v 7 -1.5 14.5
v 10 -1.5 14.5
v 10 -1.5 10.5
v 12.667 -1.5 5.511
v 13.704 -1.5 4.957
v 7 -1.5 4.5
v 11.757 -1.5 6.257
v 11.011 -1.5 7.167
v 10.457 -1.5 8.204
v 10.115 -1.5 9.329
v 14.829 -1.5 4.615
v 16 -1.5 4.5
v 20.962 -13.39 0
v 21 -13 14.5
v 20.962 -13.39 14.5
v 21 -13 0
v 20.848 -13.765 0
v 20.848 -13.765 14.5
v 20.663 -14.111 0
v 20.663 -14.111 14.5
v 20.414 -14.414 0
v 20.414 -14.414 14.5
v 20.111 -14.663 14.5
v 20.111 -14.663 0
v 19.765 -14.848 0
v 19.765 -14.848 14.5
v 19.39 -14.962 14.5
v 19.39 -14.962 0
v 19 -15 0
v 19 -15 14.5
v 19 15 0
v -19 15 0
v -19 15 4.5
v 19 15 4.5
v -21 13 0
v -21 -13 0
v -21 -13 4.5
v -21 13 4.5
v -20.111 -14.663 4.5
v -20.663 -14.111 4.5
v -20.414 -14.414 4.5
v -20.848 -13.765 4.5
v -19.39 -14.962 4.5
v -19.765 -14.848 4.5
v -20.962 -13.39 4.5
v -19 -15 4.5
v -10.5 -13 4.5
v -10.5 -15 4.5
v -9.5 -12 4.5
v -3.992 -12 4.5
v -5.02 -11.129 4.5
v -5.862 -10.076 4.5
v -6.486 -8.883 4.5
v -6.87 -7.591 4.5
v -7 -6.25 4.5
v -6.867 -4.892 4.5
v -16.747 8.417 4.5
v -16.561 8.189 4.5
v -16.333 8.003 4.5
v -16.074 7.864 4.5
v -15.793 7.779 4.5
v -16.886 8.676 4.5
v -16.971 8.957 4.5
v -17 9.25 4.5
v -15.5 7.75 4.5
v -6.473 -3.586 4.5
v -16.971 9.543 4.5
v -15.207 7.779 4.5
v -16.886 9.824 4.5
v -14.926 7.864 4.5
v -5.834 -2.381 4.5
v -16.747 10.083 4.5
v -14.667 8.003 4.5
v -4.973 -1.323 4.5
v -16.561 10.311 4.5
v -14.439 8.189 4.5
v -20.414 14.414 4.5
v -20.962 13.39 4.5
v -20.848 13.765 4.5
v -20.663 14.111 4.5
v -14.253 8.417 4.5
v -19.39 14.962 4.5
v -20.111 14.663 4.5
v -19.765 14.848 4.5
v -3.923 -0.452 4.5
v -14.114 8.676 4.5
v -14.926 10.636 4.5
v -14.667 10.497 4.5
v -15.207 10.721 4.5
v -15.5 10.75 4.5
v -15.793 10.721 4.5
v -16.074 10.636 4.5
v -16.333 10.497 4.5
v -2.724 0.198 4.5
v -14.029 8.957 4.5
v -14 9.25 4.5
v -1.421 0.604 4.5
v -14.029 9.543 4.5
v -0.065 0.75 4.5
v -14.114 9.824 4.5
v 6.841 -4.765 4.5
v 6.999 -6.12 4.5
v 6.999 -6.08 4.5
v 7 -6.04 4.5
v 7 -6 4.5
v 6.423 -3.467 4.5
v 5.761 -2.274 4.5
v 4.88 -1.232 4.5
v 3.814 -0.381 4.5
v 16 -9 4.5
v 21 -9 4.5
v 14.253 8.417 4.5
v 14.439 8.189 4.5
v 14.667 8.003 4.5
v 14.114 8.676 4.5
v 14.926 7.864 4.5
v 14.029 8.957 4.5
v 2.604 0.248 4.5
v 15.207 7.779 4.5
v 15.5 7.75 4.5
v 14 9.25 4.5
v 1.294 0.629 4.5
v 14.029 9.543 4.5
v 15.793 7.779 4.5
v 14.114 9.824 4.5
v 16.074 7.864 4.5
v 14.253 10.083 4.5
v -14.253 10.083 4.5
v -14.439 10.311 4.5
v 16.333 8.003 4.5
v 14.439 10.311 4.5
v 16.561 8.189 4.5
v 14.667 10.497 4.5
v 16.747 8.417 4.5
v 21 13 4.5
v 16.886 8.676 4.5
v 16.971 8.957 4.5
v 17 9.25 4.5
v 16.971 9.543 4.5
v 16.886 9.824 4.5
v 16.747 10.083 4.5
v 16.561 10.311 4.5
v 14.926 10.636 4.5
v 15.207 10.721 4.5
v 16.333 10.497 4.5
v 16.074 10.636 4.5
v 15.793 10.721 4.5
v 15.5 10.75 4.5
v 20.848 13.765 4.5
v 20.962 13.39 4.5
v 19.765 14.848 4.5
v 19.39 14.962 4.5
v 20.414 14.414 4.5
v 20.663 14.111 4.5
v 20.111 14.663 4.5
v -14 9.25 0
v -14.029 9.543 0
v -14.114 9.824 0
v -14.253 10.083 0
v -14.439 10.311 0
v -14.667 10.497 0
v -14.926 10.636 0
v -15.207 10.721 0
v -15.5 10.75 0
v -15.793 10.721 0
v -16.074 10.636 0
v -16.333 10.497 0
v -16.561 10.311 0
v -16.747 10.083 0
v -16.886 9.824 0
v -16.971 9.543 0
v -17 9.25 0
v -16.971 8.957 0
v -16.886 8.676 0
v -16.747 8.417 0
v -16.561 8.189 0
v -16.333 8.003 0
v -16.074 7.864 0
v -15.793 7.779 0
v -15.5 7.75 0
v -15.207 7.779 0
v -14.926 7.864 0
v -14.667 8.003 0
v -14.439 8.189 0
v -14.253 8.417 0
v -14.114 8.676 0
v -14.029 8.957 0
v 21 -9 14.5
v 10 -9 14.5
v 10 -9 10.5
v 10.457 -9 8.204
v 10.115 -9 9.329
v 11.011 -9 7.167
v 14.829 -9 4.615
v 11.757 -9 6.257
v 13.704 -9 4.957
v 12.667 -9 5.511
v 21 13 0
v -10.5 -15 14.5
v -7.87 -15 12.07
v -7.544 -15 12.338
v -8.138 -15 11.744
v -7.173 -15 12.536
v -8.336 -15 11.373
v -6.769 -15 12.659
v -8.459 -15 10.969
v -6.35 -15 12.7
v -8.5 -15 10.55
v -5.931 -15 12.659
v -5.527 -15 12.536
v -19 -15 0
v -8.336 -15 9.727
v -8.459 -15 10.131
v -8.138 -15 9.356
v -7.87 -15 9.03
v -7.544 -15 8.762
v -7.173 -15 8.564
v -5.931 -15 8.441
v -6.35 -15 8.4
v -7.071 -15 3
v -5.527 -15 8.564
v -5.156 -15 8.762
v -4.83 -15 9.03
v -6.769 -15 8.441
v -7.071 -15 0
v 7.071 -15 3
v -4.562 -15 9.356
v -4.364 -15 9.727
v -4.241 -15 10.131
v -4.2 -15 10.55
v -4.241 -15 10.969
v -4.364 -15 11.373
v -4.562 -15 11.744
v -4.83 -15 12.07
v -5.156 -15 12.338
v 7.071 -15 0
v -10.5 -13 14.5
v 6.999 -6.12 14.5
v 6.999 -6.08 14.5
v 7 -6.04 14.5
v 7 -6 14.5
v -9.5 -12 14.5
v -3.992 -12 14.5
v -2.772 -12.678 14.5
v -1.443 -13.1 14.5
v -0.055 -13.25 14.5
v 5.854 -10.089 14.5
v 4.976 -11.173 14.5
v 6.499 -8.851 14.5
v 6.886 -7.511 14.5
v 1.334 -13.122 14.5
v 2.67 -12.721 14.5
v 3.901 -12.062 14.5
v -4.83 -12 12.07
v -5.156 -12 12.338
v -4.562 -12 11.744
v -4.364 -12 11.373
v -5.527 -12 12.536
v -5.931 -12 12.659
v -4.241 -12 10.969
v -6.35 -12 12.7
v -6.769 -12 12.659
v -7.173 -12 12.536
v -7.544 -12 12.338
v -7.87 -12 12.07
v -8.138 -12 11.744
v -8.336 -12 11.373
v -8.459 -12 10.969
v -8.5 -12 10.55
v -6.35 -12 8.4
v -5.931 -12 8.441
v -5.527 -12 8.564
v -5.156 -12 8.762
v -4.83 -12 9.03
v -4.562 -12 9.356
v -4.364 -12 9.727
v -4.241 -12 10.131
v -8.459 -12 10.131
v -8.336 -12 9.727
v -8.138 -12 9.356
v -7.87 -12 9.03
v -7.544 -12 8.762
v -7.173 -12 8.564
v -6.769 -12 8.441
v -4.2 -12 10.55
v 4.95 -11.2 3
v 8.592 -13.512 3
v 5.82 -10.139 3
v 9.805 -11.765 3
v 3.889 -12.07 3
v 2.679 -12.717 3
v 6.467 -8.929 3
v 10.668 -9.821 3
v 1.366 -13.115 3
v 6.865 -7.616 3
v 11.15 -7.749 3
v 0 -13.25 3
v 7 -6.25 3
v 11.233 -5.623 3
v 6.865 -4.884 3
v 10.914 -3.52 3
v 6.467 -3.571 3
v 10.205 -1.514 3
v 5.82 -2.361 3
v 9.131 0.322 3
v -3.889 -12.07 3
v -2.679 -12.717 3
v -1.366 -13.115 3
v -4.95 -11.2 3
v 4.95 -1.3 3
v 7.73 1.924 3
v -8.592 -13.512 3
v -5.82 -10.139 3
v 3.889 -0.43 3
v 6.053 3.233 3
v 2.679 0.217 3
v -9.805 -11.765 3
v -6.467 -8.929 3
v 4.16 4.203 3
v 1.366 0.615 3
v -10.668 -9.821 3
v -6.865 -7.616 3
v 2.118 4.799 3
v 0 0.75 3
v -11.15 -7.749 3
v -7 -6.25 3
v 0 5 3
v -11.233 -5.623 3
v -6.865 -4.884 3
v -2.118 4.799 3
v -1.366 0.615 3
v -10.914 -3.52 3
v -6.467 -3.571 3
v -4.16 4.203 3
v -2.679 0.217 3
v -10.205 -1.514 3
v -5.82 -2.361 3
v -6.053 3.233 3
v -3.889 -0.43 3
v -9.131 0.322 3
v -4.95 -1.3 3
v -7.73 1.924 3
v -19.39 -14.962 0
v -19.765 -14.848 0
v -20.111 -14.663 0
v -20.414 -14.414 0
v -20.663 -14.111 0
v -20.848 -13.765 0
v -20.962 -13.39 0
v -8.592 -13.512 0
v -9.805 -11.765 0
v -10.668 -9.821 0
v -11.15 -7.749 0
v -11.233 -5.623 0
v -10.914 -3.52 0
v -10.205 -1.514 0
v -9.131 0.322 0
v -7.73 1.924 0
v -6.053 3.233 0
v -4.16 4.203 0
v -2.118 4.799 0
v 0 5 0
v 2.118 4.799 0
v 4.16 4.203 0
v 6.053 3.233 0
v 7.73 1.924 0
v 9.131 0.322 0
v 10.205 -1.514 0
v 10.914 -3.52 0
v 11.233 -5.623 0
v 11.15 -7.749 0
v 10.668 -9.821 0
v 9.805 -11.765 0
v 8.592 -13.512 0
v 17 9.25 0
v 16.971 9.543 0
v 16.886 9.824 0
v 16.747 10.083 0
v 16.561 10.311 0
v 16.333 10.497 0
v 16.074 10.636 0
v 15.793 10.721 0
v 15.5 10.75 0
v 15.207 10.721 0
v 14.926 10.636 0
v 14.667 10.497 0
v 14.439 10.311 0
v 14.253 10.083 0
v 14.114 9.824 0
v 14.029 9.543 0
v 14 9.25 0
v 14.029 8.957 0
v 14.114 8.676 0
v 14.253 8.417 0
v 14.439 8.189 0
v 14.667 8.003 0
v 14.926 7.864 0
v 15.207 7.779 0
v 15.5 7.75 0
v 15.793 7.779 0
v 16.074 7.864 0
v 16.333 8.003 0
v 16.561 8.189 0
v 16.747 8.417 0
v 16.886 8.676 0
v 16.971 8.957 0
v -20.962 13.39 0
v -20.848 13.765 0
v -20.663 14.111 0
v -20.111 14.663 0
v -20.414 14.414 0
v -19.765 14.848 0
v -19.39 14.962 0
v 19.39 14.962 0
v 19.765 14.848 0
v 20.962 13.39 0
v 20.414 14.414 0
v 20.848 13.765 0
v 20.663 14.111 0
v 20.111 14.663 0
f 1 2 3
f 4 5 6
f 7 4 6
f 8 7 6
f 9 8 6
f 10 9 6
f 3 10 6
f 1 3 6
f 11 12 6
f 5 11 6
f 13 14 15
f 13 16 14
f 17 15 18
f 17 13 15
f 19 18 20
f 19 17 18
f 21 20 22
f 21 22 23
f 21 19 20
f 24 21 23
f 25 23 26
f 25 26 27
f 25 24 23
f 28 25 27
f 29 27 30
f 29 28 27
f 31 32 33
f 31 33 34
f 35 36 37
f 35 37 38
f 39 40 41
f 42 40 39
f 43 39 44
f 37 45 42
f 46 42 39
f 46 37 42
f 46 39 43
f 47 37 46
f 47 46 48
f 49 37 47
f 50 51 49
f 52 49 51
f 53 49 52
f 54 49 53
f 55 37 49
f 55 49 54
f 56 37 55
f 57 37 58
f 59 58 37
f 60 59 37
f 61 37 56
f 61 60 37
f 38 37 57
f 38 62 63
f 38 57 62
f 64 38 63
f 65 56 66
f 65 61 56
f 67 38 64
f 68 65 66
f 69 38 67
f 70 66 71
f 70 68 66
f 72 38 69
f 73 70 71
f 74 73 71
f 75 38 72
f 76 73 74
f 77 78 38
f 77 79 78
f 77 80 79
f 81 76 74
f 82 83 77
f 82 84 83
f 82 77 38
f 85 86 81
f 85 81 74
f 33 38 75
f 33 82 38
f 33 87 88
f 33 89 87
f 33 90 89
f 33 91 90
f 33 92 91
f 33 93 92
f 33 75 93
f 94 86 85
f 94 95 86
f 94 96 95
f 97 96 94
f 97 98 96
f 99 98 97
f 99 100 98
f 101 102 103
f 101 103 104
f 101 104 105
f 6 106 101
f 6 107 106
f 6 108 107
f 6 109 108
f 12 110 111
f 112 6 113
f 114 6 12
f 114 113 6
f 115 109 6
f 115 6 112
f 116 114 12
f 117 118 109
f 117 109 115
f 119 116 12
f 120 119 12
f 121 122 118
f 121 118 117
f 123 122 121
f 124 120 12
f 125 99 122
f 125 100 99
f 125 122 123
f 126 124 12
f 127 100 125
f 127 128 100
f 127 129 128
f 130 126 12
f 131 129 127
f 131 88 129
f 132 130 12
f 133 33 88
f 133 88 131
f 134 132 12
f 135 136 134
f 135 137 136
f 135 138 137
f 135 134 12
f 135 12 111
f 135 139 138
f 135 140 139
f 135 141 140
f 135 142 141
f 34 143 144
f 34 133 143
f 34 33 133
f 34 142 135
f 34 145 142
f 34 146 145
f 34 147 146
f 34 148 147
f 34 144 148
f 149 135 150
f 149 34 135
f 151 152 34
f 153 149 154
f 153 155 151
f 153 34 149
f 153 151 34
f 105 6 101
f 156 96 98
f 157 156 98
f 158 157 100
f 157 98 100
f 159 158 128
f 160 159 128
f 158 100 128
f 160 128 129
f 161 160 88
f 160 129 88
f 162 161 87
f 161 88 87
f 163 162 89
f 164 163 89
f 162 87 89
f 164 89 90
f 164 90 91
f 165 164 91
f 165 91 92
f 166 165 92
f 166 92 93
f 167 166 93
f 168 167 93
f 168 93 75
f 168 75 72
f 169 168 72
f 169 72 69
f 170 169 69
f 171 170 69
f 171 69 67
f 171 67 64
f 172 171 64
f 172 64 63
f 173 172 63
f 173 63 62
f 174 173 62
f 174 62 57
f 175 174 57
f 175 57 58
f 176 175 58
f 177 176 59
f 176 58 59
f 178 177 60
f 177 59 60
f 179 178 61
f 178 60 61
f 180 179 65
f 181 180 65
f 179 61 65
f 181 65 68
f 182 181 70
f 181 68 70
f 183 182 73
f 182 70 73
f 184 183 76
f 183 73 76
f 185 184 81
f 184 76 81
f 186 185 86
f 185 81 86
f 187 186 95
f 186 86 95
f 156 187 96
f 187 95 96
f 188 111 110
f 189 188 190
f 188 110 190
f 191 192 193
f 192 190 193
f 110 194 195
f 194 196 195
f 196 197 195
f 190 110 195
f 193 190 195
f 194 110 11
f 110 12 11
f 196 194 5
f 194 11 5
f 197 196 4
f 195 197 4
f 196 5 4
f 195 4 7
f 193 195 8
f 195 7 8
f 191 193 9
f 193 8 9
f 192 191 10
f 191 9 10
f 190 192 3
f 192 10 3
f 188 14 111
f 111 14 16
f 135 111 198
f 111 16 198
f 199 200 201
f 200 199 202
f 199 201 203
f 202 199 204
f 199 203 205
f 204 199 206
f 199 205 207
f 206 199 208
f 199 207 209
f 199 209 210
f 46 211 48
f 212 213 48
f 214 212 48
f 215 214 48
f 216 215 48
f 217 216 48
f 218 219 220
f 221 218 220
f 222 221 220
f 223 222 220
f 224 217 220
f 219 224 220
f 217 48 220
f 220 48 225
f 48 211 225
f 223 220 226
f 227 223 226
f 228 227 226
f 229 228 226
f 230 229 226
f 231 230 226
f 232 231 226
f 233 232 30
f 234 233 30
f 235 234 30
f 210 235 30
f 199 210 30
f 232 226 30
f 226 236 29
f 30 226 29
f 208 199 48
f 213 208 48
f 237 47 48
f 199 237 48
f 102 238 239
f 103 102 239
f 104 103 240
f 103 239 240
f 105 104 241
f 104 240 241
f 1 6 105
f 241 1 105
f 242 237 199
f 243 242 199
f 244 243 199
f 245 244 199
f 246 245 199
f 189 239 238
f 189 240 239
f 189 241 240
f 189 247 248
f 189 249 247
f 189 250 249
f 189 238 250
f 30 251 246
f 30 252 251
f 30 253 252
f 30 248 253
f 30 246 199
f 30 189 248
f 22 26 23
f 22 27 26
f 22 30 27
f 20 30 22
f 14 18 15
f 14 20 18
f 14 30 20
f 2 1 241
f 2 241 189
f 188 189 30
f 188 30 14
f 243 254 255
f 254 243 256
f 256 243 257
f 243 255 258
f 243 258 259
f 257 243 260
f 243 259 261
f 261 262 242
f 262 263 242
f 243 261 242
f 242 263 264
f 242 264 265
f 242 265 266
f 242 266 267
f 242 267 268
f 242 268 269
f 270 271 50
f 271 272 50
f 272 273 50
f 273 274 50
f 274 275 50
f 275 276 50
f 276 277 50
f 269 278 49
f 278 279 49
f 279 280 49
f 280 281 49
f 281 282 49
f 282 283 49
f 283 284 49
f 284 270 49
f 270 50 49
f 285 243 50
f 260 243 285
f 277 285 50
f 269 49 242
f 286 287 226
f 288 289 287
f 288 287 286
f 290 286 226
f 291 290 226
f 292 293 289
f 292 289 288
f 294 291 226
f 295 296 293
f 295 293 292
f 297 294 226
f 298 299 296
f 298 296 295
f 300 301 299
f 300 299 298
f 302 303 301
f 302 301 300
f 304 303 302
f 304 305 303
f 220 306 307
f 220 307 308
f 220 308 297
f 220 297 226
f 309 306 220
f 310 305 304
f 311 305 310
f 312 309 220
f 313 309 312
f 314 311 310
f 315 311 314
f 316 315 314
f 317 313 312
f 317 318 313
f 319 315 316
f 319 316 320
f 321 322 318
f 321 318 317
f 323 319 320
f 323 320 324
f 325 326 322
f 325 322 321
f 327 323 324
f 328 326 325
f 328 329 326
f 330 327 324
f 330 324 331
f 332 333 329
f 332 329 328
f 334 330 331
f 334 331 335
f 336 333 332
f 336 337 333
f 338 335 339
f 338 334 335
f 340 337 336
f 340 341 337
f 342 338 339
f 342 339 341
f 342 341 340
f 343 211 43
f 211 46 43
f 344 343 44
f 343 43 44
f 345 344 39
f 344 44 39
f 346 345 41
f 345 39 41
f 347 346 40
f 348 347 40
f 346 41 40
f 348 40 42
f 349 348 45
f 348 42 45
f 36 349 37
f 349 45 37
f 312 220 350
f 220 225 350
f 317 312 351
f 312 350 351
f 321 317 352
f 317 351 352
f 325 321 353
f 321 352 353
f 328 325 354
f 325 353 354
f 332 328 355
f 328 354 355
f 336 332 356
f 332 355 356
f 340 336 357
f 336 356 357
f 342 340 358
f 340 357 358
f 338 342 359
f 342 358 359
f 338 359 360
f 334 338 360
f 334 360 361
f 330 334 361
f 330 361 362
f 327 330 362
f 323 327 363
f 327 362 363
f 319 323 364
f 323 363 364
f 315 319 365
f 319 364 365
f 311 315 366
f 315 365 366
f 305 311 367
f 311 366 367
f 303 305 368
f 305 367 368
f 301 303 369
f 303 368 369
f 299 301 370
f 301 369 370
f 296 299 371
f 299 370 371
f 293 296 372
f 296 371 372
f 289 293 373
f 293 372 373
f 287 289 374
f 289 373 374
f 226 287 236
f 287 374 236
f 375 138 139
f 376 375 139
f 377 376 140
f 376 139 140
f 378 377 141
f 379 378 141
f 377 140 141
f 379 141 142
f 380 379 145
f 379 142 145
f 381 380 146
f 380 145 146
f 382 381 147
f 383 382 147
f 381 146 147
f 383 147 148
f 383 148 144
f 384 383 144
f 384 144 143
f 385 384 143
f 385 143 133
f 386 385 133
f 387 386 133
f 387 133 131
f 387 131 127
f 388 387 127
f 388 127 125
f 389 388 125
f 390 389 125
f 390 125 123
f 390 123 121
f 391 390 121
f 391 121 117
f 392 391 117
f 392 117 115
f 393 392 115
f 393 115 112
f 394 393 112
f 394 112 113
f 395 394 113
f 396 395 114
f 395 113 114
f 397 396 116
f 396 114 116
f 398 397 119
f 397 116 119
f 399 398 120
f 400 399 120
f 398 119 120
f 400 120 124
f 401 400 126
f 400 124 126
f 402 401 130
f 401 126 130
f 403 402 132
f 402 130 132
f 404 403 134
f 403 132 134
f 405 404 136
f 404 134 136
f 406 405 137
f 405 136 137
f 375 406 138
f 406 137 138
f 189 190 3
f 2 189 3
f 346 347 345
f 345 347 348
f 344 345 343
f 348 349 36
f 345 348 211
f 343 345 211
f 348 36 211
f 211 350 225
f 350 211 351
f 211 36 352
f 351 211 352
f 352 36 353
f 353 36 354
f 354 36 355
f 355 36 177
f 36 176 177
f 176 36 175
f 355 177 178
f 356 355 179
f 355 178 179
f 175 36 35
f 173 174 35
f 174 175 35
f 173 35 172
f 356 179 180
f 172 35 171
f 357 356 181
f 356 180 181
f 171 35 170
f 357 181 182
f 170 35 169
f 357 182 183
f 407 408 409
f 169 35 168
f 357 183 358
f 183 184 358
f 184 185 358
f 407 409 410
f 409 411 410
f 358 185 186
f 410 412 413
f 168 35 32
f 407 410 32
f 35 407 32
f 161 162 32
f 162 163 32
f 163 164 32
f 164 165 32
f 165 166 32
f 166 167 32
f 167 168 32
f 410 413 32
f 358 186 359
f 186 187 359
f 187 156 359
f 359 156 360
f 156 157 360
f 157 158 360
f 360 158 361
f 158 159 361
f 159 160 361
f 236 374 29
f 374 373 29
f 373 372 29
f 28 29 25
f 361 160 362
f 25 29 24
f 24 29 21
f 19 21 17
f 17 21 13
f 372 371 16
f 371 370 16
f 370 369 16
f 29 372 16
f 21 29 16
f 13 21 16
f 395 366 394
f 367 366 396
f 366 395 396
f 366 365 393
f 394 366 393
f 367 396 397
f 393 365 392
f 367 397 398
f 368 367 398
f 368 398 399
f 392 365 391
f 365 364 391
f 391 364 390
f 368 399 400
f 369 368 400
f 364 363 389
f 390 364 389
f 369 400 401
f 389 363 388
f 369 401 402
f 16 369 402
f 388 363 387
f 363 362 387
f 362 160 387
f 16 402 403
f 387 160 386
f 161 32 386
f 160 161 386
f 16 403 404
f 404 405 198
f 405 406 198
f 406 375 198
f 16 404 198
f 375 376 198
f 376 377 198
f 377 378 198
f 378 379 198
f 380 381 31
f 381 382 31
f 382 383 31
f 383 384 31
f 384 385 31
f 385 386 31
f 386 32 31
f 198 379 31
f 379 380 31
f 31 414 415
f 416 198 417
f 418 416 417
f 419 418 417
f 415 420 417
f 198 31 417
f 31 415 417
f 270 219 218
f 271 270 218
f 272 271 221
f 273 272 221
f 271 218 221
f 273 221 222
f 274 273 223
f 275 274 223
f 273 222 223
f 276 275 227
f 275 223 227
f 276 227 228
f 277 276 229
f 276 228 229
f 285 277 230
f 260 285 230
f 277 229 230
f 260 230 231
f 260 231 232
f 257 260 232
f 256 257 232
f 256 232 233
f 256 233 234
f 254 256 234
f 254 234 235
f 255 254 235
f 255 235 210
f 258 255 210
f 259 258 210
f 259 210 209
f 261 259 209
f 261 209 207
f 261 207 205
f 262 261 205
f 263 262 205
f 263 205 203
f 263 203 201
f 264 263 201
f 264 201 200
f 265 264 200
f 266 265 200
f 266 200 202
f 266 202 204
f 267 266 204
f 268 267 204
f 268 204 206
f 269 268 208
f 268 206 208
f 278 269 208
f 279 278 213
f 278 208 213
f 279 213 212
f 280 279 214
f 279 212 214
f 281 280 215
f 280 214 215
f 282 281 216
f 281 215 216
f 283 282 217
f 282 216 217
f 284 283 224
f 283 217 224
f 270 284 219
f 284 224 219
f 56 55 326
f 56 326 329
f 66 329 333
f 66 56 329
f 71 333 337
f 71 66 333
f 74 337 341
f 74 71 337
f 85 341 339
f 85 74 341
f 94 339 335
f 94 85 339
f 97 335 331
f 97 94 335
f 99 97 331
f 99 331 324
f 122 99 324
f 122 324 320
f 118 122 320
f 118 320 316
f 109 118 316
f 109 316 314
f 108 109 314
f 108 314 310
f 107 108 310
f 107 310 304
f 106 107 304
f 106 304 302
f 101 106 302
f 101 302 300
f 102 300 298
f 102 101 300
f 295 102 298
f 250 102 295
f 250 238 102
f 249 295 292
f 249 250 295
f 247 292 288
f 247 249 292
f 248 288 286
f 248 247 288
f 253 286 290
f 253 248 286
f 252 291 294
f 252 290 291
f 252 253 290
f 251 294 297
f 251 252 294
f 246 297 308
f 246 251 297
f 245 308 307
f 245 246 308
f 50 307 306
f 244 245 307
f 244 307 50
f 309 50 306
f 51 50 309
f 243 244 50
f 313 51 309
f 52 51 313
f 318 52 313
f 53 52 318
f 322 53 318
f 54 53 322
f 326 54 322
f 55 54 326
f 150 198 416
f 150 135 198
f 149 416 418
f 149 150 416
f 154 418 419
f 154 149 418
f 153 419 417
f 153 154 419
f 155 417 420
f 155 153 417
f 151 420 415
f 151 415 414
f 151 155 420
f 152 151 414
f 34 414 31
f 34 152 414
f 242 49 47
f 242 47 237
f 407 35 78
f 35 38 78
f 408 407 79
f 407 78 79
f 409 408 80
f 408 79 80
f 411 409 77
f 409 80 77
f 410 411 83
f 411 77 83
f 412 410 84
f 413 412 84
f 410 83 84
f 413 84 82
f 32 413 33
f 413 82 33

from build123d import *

# Parameters (mm, degrees)
SKETCH1_W               = 42
SKETCH1_H               = 30
BOSS_EXTRUDE1_DEPTH     = 4.5
BOSS_EXTRUDE2_DEPTH     = 10
FILLET1_R               = 6
SKETCH3_R               = 11.25
CUT_EXTRUDE1_DEPTH      = 3
CUT_EXTRUDE2_DEPTH      = 29.253318389
CUT_EXTRUDE2_DEPTH_BACK = 29.253318389
SKETCH4_R               = 7
FILLET2_R               = 2
CHAMFER1_SIZE           = 1
SKETCH6_R               = 2.15
CUT_EXTRUDE4_DEPTH      = 40.385911187
SKETCH7_R               = 1.5
CUT_EXTRUDE5_DEPTH      = 10


with BuildPart() as part:
    # Sketch1 → Boss-Extrude1 (new body)
    with BuildSketch(Plane.XY):
        Rectangle(SKETCH1_W, SKETCH1_H)
    extrude(amount=BOSS_EXTRUDE1_DEPTH)

    # Sketch2 → Boss-Extrude2 (add)
    with BuildSketch(Plane.XY.offset(4.5)):
        Polygon((21, -9), (10, -9), (10, -1.5), (7, -1.5), (7, -12), (-10.5, -12), (-10.5, -15), (21, -15), align=None)
    extrude(amount=BOSS_EXTRUDE2_DEPTH)

    # Fillet1
    fillet1_edges = [part.edges().sort_by_distance(p)[0] for p in [
        (10, -5.25, 4.5),
        (7, -12, 9.5),
    ]]
    fillet(fillet1_edges, radius=FILLET1_R)

    # Sketch3 → Cut-Extrude1 (cut)
    with BuildSketch(Plane(origin=(0, 0, 0), x_dir=(-1, 0, 0), z_dir=(0, 0, -1))):
        with Locations((0, -6.25)):
            Circle(SKETCH3_R)
    extrude(amount=-CUT_EXTRUDE1_DEPTH, mode=Mode.SUBTRACT)

    # Sketch4 → Cut-Extrude2 (cut, two sides: drawn at the far end of the back side and taken through both)
    with BuildSketch(Plane(origin=(0, 0, 3), x_dir=(-1, 0, 0), z_dir=(0, 0, -1)).offset(-CUT_EXTRUDE2_DEPTH_BACK)):
        with Locations((0, -6.25)):
            Circle(SKETCH4_R)
    extrude(amount=CUT_EXTRUDE2_DEPTH + CUT_EXTRUDE2_DEPTH_BACK, mode=Mode.SUBTRACT)

    # Fillet2
    fillet2_edges = [part.edges().sort_by_distance(p)[0] for p in [
        (21, -15, 7.25),
        (-21, -15, 2.25),
        (-21, 15, 2.25),
        (21, 15, 2.25),
    ]]
    fillet(fillet2_edges, radius=FILLET2_R)

    # Chamfer1
    chamfer1_edges = [part.edges().sort_by_distance(p)[0] for p in [
        (-10.5, -12, 9.5),
    ]]
    chamfer(chamfer1_edges, length=CHAMFER1_SIZE)

    # Sketch6 → Cut-Extrude4 (cut, through all)
    with BuildSketch(Plane.XZ.offset(15)):
        with Locations(Location((-6.35, 10.55, 0), (0, 0, 270))):
            Circle(SKETCH6_R)
    extrude(amount=-CUT_EXTRUDE4_DEPTH, mode=Mode.SUBTRACT)

    # Sketch7 → Cut-Extrude5 (cut)
    with BuildSketch(Plane.XY.offset(4.5)):
        with Locations((-15.5, 9.25)):
            Circle(SKETCH7_R)
        with Locations((15.5, 9.25)):
            Circle(SKETCH7_R)
    extrude(amount=-CUT_EXTRUDE5_DEPTH, mode=Mode.SUBTRACT)


solid = part.part
